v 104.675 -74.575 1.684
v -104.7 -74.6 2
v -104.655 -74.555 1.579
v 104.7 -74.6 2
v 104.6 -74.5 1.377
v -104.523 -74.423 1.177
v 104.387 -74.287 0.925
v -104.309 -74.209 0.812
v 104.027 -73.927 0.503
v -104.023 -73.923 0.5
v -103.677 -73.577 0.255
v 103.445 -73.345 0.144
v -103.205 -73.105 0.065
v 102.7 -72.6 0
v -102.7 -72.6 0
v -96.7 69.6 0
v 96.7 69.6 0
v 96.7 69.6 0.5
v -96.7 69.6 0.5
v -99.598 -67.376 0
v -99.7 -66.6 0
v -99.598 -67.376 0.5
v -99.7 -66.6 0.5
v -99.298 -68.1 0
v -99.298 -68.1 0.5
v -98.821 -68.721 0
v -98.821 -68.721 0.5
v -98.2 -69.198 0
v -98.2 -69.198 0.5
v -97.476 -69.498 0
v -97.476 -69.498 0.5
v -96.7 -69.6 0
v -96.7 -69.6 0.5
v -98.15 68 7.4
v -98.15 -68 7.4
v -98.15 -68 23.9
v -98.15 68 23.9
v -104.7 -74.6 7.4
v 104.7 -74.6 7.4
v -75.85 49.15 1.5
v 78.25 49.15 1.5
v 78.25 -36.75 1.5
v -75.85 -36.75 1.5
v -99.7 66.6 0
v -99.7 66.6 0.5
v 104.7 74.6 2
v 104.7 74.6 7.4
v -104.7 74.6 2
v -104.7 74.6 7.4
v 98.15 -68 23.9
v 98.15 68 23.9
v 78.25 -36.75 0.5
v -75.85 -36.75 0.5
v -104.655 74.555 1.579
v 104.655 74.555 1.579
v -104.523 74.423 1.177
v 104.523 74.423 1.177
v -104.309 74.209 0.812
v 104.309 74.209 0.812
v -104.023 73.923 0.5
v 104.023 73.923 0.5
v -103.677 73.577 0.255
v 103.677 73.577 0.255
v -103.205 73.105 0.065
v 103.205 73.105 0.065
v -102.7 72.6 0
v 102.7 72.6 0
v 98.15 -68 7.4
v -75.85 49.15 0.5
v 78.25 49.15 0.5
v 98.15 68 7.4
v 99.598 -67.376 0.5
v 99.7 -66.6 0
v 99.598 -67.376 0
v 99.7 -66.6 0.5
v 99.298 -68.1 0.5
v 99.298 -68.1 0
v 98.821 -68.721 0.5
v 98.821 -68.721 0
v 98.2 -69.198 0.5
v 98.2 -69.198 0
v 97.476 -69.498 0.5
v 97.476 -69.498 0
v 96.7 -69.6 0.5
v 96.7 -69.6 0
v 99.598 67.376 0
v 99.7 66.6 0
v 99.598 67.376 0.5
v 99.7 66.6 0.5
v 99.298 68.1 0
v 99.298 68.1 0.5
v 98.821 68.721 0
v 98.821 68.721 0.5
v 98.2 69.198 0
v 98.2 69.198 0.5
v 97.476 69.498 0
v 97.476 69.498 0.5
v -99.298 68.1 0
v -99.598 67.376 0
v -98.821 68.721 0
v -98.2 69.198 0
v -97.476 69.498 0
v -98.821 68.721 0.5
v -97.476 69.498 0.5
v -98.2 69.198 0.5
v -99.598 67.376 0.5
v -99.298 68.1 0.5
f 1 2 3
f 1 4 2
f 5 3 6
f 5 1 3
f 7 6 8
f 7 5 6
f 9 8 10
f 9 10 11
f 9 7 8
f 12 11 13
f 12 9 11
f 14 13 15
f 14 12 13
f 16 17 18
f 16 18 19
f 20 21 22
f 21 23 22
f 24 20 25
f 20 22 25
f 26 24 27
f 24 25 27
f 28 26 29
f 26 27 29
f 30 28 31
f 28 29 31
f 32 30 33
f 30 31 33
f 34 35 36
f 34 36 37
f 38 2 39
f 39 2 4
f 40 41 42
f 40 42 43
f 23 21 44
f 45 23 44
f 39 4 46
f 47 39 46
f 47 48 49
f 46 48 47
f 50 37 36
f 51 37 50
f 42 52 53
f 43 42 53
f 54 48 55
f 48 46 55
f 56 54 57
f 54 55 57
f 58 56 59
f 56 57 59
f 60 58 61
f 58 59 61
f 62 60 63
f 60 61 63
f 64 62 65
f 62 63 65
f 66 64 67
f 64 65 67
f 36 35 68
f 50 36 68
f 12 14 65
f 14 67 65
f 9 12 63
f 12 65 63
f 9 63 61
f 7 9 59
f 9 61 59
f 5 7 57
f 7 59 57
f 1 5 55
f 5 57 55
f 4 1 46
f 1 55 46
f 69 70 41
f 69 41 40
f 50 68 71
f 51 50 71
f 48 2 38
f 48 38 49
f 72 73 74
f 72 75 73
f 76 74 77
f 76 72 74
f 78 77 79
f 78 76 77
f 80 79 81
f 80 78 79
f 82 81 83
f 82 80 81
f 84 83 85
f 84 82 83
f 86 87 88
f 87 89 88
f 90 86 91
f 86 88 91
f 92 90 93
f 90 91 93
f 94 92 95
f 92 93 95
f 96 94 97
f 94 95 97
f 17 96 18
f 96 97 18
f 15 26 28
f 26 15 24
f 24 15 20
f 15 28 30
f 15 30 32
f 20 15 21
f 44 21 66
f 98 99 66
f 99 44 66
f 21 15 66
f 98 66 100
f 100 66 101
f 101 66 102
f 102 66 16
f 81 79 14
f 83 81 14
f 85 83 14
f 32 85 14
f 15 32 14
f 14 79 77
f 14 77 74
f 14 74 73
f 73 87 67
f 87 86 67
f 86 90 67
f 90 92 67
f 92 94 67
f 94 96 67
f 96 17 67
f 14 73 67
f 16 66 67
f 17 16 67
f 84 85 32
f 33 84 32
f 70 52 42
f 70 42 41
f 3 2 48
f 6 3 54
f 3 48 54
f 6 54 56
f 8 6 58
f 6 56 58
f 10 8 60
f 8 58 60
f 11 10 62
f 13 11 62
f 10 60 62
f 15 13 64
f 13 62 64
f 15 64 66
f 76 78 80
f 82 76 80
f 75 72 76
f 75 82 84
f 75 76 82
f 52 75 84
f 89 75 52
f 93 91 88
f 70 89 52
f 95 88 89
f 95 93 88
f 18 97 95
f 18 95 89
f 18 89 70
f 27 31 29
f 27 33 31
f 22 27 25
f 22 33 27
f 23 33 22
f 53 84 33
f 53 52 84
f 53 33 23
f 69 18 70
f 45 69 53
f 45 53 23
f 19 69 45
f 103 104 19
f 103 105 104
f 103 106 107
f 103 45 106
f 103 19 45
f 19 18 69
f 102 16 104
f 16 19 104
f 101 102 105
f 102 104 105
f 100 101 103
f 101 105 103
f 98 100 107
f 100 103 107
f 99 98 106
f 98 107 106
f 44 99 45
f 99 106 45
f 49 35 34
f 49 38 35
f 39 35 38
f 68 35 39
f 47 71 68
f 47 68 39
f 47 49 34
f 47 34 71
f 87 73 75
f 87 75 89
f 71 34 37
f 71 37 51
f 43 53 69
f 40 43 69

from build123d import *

# Parameters (mm, degrees)
SKETCH_1_W          = 209.4
SKETCH_1_H          = 149.2
EXTRUDE_1_DEPTH     = 7.4
SKETCH_2_W          = 196.3
SKETCH_2_H          = 136
EXTRUDE_2_DEPTH     = 16.5
SKETCH_4_W          = 154.1
SKETCH_4_H          = 85.9
CUT_EXTRUDE_1_DEPTH = 1.5
FILLET_1_R          = 2
SKETCH_5_W          = 199.4
SKETCH_5_H          = 139.2
CUT_EXTRUDE_2_DEPTH = 0.5
FILLET_2_R          = 3


with BuildPart() as part:
    # 草图1 → 凸台-拉伸1 (new body)
    with BuildSketch(Plane.XY):
        Rectangle(SKETCH_1_W, SKETCH_1_H)
    extrude(amount=EXTRUDE_1_DEPTH)

    # 草图2 → 凸台-拉伸2 (add)
    with BuildSketch(Plane.XY.offset(7.4)):
        Rectangle(SKETCH_2_W, SKETCH_2_H)
    extrude(amount=EXTRUDE_2_DEPTH)

    # 草图4 → 切除-拉伸1 (cut)
    with BuildSketch(Plane(origin=(0, 0, 0), x_dir=(-1, 0, 0), z_dir=(0, 0, -1))):
        with Locations((-1.2, 6.2)):
            Rectangle(SKETCH_4_W, SKETCH_4_H)
    extrude(amount=-CUT_EXTRUDE_1_DEPTH, mode=Mode.SUBTRACT)

    # 圆角1
    fillet_1_edges = [part.edges().sort_by_distance(p)[0] for p in [
        (0, 74.6, 0),
        (104.7, 0, 0),
        (0, -74.6, 0),
        (-104.7, 0, 0),
    ]]
    fillet(fillet_1_edges, radius=FILLET_1_R)

    # 草图5 → 切除-拉伸2 (cut)
    with BuildSketch(Plane(origin=(0, 0, 0), x_dir=(-1, 0, 0), z_dir=(0, 0, -1))):
        Rectangle(SKETCH_5_W, SKETCH_5_H)
    extrude(amount=-CUT_EXTRUDE_2_DEPTH, mode=Mode.SUBTRACT)

    # 圆角2
    fillet_2_edges = [part.edges().sort_by_distance(p)[0] for p in [
        (99.7, -69.6, 0.25),
        (99.7, 69.6, 0.25),
        (-99.7, 69.6, 0.25),
        (-99.7, -69.6, 0.25),
    ]]
    fillet(fillet_2_edges, radius=FILLET_2_R)


solid = part.part
